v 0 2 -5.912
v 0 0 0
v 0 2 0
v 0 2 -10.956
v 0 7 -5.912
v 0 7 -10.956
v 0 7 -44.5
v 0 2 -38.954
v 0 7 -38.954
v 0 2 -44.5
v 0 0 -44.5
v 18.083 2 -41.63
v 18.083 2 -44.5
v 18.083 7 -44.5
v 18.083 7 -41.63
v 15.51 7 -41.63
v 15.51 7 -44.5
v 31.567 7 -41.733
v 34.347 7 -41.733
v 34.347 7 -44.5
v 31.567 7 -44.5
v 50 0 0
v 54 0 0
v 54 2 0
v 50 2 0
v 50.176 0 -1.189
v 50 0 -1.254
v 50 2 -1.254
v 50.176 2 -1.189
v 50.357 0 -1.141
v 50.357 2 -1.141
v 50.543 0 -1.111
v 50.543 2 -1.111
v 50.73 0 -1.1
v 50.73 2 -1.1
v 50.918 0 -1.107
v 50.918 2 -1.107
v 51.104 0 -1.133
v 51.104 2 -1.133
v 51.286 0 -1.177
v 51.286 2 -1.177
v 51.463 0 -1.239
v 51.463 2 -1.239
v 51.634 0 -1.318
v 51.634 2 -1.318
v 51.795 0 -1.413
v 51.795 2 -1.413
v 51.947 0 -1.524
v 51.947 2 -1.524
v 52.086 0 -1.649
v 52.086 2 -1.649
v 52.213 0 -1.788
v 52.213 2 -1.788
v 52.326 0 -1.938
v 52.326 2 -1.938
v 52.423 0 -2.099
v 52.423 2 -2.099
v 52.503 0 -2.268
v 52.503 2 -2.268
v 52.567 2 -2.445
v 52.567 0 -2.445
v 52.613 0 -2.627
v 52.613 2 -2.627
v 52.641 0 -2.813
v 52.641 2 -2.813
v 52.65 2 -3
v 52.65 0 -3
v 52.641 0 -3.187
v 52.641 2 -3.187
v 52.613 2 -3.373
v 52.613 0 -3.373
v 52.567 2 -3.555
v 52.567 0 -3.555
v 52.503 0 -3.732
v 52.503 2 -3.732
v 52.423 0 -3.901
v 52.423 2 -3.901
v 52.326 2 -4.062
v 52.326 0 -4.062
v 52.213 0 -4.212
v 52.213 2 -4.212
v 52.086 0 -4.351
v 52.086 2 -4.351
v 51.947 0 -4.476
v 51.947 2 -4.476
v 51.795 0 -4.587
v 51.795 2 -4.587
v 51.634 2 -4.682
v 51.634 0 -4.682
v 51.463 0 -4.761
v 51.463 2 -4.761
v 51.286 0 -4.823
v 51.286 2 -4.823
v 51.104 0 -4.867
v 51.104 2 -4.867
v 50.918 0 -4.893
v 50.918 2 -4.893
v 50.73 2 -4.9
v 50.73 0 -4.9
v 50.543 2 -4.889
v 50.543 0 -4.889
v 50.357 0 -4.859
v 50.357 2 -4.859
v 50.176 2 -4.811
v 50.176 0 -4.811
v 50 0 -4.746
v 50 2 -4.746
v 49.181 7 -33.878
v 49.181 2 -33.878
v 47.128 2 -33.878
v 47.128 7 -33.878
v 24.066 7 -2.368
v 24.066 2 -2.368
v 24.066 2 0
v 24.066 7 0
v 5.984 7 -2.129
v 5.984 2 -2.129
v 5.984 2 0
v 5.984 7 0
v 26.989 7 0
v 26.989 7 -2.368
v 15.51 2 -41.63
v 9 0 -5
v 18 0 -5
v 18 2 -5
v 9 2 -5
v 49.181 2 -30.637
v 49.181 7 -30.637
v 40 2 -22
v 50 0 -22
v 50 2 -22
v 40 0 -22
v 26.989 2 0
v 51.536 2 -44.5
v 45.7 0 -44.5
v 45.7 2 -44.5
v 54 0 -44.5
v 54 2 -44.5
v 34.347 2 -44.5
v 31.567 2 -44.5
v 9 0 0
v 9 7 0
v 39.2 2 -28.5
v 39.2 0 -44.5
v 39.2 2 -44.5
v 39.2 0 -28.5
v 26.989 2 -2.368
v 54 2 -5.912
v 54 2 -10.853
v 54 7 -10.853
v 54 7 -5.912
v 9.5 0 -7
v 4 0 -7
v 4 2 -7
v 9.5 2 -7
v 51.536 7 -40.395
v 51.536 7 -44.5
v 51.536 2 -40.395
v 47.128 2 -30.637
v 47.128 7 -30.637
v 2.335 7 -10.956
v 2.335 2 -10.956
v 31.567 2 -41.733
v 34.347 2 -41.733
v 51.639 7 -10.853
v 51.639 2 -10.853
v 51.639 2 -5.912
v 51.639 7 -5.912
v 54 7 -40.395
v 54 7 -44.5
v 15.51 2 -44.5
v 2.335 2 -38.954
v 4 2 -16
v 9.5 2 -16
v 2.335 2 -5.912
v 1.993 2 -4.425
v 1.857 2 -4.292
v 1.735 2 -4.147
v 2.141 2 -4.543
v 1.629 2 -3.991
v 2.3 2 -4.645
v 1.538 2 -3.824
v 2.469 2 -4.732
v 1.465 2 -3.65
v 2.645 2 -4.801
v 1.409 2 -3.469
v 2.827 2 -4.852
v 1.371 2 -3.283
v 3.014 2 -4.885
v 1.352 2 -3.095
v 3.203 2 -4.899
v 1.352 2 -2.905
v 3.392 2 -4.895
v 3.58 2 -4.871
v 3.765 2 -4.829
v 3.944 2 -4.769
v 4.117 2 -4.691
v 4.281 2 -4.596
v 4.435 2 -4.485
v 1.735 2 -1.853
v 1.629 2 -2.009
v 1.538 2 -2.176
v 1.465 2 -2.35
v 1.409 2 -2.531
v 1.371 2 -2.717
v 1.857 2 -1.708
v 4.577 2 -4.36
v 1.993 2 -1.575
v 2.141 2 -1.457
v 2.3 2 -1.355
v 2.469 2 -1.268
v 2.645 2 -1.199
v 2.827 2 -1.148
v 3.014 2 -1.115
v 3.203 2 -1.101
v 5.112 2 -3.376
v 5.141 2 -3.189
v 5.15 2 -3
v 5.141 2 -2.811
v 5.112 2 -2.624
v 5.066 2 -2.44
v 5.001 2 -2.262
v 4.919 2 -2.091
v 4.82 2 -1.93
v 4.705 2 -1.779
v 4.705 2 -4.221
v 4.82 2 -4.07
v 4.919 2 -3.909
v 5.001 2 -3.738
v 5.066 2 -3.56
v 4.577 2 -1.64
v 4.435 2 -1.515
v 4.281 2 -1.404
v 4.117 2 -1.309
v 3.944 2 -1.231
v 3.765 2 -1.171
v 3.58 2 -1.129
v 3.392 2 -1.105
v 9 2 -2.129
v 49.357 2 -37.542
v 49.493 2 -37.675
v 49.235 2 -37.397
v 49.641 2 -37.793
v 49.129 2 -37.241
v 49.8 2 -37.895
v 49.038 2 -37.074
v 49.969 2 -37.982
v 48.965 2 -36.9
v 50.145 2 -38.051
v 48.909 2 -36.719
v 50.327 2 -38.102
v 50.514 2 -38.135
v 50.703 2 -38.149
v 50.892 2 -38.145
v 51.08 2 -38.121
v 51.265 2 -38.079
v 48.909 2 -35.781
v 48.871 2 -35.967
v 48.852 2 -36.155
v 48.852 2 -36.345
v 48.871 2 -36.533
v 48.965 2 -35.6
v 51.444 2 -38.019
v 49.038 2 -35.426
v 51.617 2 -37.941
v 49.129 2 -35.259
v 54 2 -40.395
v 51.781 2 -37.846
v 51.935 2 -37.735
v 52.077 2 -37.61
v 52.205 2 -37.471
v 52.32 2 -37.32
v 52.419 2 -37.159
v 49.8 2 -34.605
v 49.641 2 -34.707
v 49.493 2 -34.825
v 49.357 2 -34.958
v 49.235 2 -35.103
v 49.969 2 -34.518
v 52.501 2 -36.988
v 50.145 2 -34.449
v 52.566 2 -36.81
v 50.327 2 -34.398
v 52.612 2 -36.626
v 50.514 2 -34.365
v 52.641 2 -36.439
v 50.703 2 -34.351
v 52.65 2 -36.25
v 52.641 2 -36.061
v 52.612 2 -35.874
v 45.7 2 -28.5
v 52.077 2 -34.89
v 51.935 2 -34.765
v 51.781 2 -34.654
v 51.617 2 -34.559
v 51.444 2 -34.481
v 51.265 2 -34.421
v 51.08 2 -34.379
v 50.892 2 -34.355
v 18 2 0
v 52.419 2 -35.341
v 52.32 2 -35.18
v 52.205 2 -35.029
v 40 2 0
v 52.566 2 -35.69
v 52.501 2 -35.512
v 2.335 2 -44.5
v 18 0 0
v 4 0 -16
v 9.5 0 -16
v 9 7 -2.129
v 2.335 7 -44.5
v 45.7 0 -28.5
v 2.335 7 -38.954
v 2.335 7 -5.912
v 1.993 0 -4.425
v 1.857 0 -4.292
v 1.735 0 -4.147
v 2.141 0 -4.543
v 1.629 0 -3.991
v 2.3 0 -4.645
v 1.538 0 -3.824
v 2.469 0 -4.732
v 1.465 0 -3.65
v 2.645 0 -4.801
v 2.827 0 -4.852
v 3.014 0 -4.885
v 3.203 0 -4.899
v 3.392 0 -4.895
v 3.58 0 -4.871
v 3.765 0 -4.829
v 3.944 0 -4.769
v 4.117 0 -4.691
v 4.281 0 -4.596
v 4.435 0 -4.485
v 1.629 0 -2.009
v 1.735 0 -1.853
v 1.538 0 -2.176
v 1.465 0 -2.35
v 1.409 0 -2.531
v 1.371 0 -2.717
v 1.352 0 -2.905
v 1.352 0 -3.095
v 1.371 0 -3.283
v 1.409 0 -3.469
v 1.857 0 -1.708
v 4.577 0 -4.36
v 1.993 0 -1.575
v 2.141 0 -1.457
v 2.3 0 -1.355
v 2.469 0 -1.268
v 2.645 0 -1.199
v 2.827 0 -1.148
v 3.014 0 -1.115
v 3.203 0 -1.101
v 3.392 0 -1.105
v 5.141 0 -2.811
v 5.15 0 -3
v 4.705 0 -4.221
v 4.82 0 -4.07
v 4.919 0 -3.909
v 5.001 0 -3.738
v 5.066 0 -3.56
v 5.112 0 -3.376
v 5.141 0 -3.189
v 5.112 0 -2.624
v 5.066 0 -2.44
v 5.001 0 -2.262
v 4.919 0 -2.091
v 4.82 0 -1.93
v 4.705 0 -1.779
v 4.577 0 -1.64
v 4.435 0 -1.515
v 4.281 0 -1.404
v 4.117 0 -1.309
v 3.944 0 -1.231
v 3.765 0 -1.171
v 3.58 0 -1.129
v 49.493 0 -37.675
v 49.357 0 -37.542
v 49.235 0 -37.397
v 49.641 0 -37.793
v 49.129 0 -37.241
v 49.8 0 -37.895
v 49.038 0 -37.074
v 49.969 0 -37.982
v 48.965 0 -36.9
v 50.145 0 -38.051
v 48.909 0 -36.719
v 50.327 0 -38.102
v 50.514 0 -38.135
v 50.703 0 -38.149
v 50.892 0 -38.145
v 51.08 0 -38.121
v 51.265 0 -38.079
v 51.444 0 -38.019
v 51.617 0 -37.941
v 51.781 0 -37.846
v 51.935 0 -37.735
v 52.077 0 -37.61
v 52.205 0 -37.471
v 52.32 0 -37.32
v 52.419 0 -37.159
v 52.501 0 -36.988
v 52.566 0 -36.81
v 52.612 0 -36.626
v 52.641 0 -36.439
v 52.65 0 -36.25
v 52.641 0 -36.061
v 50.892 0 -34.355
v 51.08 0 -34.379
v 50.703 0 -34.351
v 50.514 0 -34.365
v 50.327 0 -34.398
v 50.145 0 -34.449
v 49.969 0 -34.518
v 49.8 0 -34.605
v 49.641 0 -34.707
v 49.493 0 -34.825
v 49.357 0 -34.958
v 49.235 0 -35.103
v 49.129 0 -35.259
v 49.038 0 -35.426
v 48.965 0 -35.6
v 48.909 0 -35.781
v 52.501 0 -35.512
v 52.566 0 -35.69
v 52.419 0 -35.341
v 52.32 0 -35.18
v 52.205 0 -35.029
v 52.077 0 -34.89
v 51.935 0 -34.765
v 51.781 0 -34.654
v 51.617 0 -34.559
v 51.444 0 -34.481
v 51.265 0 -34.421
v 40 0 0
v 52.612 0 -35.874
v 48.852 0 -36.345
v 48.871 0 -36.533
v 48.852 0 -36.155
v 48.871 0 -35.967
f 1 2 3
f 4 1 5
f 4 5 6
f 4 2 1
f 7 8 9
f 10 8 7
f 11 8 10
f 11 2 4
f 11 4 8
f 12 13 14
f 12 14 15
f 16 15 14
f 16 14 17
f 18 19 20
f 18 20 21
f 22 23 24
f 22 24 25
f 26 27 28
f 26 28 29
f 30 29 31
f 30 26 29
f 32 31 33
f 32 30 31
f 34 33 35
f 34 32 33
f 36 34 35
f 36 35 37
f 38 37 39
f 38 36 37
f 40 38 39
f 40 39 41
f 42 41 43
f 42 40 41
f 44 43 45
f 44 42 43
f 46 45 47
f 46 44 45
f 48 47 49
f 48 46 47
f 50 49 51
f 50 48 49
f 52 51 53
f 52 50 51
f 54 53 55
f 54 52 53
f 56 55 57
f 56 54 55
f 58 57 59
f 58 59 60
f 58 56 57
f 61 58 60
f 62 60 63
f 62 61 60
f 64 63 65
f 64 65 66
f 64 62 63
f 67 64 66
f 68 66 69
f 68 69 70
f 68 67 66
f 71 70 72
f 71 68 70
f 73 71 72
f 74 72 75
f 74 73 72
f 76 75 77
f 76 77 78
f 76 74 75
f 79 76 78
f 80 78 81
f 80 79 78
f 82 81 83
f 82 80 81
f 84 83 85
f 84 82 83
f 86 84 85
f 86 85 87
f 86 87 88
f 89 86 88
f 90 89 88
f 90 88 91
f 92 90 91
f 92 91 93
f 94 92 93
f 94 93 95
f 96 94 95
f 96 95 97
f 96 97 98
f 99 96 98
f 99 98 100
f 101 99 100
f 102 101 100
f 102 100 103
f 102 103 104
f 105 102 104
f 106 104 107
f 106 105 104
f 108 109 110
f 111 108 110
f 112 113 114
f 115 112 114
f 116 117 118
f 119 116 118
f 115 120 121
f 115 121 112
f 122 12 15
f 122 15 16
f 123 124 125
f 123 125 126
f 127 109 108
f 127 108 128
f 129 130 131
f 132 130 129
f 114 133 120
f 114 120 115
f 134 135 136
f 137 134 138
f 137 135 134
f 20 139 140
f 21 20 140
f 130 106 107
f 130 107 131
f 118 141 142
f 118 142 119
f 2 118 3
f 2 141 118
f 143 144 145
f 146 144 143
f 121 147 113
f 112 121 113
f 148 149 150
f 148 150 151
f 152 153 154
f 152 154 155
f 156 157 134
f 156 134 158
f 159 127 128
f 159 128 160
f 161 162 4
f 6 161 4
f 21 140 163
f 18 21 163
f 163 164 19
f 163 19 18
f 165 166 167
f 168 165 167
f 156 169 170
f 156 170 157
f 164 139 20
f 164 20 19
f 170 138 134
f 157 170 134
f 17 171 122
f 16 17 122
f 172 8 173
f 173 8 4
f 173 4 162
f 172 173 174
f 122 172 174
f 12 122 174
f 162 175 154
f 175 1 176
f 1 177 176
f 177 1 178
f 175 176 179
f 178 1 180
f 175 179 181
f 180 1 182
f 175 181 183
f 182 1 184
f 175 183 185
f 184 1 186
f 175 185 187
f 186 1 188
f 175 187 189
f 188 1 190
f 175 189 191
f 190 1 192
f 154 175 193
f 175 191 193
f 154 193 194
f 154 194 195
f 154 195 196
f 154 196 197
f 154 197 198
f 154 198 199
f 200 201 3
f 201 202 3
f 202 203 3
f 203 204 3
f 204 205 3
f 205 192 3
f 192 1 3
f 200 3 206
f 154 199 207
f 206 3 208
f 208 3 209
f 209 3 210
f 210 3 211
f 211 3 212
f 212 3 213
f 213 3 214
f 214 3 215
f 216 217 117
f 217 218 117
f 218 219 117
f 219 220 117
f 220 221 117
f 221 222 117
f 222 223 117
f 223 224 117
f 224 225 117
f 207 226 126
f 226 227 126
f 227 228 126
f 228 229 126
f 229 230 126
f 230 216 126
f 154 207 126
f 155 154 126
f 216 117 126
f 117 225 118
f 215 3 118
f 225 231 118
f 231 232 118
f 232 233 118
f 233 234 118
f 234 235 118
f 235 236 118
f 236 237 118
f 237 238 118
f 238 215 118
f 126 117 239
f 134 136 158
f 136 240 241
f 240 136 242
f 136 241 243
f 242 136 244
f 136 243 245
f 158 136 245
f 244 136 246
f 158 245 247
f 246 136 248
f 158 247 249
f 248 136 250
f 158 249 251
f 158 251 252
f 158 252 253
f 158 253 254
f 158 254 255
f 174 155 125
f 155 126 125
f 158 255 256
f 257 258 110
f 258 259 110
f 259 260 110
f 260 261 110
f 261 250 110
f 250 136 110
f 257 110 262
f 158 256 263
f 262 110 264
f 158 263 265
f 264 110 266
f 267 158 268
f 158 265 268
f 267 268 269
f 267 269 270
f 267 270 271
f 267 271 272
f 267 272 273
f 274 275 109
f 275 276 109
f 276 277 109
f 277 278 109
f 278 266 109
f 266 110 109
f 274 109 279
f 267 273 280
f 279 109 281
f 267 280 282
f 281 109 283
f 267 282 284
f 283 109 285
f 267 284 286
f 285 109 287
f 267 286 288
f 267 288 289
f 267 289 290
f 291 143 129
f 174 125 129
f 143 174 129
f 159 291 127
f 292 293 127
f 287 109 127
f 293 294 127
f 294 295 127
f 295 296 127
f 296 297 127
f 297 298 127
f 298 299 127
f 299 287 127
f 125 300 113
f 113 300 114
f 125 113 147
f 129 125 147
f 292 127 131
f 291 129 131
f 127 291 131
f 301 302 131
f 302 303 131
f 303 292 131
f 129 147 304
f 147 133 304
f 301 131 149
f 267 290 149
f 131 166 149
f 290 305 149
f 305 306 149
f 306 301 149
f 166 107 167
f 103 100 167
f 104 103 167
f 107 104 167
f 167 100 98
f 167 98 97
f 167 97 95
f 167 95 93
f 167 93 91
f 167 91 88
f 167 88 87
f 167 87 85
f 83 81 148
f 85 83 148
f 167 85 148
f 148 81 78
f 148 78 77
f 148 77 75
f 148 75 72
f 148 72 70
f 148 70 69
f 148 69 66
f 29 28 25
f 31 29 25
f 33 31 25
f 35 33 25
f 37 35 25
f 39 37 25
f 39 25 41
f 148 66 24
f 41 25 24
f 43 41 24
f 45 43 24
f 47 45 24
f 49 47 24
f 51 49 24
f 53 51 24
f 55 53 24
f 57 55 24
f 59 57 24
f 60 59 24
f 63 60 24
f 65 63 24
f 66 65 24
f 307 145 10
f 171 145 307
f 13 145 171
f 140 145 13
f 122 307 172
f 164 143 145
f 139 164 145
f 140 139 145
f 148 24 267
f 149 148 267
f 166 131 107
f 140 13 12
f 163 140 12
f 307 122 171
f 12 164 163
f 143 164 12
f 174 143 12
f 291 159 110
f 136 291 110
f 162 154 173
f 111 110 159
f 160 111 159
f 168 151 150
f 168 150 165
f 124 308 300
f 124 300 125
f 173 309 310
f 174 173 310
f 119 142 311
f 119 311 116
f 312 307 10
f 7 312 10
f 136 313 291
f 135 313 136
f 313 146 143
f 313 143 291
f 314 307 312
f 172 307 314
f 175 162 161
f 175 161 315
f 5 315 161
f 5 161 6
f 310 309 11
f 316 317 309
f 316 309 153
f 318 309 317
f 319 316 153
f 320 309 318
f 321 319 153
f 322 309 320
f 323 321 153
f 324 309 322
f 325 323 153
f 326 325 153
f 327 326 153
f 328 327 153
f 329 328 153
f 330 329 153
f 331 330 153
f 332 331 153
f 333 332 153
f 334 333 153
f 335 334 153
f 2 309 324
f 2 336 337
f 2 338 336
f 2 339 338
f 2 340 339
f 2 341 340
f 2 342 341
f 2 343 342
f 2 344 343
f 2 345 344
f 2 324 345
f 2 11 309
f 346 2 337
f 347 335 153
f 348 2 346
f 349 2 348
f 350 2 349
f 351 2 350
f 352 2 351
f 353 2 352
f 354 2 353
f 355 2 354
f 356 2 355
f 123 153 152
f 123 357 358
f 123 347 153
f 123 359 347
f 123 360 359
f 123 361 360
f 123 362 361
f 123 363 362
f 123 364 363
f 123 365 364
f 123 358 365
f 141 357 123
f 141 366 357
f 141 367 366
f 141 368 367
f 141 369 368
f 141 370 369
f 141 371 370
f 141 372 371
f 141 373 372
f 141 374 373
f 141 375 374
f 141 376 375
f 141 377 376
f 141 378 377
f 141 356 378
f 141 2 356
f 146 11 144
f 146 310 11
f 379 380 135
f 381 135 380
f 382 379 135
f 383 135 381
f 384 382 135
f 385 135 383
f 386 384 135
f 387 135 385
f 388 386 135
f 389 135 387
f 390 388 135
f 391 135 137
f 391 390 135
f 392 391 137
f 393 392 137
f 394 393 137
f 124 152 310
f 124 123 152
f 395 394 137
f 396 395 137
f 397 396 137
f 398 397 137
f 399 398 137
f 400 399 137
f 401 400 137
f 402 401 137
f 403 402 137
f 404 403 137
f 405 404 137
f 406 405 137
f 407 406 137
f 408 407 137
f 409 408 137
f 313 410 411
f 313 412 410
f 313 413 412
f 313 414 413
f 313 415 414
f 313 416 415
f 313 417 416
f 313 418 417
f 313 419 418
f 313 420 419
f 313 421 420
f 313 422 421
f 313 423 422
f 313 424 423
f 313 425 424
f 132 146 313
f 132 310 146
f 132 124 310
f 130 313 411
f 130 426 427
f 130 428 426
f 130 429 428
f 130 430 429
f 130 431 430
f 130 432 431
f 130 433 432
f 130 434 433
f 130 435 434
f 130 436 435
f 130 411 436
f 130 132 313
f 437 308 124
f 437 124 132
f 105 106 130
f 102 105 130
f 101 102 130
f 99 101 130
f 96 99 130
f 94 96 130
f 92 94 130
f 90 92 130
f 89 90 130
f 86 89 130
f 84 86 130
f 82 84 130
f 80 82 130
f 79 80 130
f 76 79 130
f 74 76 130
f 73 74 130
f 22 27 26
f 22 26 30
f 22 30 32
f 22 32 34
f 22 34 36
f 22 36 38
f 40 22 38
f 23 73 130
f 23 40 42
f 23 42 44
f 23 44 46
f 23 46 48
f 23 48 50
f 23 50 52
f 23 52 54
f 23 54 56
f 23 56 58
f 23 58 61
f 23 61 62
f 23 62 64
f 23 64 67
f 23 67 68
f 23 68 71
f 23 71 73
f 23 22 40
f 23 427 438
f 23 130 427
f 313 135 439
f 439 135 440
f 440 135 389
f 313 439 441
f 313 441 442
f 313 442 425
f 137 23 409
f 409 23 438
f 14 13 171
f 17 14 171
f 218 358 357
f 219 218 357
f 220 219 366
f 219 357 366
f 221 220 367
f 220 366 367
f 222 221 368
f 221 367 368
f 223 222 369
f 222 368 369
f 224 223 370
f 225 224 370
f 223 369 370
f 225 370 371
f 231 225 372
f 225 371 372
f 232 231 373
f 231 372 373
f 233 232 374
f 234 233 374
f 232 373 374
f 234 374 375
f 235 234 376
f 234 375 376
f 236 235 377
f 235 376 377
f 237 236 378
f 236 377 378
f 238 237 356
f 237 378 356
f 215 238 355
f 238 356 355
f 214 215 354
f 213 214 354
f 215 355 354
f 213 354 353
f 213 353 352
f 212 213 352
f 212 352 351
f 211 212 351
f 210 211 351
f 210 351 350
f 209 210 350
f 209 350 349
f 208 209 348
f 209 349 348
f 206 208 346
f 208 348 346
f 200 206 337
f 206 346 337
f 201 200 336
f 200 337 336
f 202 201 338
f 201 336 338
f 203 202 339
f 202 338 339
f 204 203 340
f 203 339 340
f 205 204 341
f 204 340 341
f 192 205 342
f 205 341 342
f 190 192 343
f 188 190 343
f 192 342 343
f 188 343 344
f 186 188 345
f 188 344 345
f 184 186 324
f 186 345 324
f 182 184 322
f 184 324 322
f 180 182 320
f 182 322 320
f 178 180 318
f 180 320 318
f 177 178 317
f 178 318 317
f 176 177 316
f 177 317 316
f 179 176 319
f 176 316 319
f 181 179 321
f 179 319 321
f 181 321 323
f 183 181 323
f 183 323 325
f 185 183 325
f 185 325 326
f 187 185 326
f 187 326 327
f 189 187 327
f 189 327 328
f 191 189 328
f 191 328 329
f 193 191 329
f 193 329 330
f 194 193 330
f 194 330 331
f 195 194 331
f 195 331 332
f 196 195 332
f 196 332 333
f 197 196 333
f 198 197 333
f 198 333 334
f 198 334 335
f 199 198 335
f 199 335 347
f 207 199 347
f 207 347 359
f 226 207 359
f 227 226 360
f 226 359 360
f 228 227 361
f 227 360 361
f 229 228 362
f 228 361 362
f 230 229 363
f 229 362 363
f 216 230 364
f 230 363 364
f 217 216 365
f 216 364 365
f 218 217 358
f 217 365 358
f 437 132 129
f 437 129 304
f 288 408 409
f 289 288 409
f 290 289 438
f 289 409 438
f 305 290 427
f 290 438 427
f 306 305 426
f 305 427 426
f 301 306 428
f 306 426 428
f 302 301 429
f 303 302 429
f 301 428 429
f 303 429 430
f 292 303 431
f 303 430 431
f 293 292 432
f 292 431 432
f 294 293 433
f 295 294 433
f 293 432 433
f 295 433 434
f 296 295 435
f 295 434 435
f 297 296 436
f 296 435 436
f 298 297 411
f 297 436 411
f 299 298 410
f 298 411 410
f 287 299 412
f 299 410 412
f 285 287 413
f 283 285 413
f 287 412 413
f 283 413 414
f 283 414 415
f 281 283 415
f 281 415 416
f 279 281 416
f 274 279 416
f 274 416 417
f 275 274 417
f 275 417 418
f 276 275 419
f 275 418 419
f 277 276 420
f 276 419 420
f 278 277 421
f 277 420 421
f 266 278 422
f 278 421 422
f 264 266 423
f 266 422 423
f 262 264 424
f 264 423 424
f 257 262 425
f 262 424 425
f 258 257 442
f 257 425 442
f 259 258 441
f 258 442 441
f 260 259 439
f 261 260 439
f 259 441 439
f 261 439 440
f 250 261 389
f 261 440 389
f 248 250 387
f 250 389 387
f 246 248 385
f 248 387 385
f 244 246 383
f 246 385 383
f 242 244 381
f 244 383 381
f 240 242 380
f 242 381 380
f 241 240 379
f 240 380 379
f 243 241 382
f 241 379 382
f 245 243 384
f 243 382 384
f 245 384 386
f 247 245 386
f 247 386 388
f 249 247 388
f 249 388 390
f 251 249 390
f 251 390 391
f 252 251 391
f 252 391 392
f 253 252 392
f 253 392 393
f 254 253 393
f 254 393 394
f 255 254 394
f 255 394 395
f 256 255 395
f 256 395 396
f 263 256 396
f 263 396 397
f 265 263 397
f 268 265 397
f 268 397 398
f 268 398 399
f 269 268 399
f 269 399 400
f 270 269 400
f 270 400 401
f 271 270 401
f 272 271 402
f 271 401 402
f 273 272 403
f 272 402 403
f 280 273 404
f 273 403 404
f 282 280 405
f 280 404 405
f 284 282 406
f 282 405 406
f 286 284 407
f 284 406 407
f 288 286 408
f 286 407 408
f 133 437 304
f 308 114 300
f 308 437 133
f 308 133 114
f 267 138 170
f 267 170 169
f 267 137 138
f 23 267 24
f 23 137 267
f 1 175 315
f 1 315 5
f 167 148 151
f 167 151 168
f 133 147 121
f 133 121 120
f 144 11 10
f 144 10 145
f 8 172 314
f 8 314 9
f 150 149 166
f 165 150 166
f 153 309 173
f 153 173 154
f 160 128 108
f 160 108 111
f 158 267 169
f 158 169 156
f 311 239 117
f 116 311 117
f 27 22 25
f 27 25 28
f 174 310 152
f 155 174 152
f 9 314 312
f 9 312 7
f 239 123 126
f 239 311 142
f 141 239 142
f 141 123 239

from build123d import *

# Parameters (mm, degrees)
F0_R     = 1.9
F0_W     = 5.5
F0_H     = 9
F1_DEPTH = 2
F2_W     = 2.334564
F2_H     = 5.043705
F2_H_2   = 5.546409
F2_W_2   = 2.573319
F2_H_3   = 2.870157
F2_W_3   = 2.779186
F2_H_4   = 2.767223
F2_W_4   = 2.46357
F2_H_5   = 4.105347
F2_W_5   = 2.360641
F2_H_6   = 4.940772
F2_W_6   = 2.923315
F2_H_7   = 2.368381
F2_W_7   = 3.015692
F2_H_8   = 2.129448
F2_W_8   = 2.052944
F2_H_9   = 3.241269
F3_DEPTH = 5


with BuildPart() as f1:
    # F0 (on Front) → F1 (new body)
    with BuildSketch(Plane.XZ):
        with BuildLine():
            Line((9, 0), (0, 0))
            Line((0, 0), (0, -44.5))
            Line((0, -44.5), (39.2, -44.5))
            Line((39.2, -44.5), (39.2, -28.5))
            Line((39.2, -28.5), (45.7, -28.5))
            Line((45.7, -28.5), (45.7, -44.5))
            Line((45.7, -44.5), (54, -44.5))
            Line((54, -44.5), (54, 0))
            Line((54, 0), (50, 0))
            Line((50, 0), (50, -1.254291))
            ThreePointArc((50, -1.254291), (52.65, -3), (50, -4.745709))
            Line((50, -4.745709), (50, -22))
            Line((50, -22), (40, -22))
            Line((40, -22), (40, 0))
            Line((40, 0), (18, 0))
            Line((18, 0), (18, -5))
            Line((18, -5), (9, -5))
            Line((9, -5), (9, 0))
        make_face()
        with Locations((50.75, -36.25)):
            Circle(F0_R, mode=Mode.SUBTRACT)
        with Locations((6.75, -11.5)):
            Rectangle(F0_W, F0_H, mode=Mode.SUBTRACT)
        with Locations((3.25, -3)):
            Circle(F0_R, mode=Mode.SUBTRACT)
    extrude(amount=-F1_DEPTH)

    # F2 (on face) → F3 (join)
    with BuildSketch(Plane(origin=(0, 2, 0), x_dir=(-1, 0, 0), z_dir=(0, 1, 0))):
        with Locations((-1.167282, -8.434026)):
            Rectangle(F2_W, F2_H)
        with Locations((-1.167282, -41.726795)):
            Rectangle(F2_W, F2_H_2)
        with Locations((-16.796619, -43.064921)):
            Rectangle(F2_W_2, F2_H_3)
        with Locations((-32.957062, -43.116388)):
            Rectangle(F2_W_3, F2_H_4)
        with Locations((-52.768215, -42.447327)):
            Rectangle(F2_W_4, F2_H_5)
        with Locations((-52.819679, -8.382559)):
            Rectangle(F2_W_5, F2_H_6)
        with Locations((-25.527491, -1.18419)):
            Rectangle(F2_W_6, F2_H_7)
        with Locations((-7.492154, -1.064724)):
            Rectangle(F2_W_7, F2_H_8)
        with Locations((-48.154229, -32.257447)):
            Rectangle(F2_W_8, F2_H_9)
    extrude(amount=F3_DEPTH)


solid = f1.part
